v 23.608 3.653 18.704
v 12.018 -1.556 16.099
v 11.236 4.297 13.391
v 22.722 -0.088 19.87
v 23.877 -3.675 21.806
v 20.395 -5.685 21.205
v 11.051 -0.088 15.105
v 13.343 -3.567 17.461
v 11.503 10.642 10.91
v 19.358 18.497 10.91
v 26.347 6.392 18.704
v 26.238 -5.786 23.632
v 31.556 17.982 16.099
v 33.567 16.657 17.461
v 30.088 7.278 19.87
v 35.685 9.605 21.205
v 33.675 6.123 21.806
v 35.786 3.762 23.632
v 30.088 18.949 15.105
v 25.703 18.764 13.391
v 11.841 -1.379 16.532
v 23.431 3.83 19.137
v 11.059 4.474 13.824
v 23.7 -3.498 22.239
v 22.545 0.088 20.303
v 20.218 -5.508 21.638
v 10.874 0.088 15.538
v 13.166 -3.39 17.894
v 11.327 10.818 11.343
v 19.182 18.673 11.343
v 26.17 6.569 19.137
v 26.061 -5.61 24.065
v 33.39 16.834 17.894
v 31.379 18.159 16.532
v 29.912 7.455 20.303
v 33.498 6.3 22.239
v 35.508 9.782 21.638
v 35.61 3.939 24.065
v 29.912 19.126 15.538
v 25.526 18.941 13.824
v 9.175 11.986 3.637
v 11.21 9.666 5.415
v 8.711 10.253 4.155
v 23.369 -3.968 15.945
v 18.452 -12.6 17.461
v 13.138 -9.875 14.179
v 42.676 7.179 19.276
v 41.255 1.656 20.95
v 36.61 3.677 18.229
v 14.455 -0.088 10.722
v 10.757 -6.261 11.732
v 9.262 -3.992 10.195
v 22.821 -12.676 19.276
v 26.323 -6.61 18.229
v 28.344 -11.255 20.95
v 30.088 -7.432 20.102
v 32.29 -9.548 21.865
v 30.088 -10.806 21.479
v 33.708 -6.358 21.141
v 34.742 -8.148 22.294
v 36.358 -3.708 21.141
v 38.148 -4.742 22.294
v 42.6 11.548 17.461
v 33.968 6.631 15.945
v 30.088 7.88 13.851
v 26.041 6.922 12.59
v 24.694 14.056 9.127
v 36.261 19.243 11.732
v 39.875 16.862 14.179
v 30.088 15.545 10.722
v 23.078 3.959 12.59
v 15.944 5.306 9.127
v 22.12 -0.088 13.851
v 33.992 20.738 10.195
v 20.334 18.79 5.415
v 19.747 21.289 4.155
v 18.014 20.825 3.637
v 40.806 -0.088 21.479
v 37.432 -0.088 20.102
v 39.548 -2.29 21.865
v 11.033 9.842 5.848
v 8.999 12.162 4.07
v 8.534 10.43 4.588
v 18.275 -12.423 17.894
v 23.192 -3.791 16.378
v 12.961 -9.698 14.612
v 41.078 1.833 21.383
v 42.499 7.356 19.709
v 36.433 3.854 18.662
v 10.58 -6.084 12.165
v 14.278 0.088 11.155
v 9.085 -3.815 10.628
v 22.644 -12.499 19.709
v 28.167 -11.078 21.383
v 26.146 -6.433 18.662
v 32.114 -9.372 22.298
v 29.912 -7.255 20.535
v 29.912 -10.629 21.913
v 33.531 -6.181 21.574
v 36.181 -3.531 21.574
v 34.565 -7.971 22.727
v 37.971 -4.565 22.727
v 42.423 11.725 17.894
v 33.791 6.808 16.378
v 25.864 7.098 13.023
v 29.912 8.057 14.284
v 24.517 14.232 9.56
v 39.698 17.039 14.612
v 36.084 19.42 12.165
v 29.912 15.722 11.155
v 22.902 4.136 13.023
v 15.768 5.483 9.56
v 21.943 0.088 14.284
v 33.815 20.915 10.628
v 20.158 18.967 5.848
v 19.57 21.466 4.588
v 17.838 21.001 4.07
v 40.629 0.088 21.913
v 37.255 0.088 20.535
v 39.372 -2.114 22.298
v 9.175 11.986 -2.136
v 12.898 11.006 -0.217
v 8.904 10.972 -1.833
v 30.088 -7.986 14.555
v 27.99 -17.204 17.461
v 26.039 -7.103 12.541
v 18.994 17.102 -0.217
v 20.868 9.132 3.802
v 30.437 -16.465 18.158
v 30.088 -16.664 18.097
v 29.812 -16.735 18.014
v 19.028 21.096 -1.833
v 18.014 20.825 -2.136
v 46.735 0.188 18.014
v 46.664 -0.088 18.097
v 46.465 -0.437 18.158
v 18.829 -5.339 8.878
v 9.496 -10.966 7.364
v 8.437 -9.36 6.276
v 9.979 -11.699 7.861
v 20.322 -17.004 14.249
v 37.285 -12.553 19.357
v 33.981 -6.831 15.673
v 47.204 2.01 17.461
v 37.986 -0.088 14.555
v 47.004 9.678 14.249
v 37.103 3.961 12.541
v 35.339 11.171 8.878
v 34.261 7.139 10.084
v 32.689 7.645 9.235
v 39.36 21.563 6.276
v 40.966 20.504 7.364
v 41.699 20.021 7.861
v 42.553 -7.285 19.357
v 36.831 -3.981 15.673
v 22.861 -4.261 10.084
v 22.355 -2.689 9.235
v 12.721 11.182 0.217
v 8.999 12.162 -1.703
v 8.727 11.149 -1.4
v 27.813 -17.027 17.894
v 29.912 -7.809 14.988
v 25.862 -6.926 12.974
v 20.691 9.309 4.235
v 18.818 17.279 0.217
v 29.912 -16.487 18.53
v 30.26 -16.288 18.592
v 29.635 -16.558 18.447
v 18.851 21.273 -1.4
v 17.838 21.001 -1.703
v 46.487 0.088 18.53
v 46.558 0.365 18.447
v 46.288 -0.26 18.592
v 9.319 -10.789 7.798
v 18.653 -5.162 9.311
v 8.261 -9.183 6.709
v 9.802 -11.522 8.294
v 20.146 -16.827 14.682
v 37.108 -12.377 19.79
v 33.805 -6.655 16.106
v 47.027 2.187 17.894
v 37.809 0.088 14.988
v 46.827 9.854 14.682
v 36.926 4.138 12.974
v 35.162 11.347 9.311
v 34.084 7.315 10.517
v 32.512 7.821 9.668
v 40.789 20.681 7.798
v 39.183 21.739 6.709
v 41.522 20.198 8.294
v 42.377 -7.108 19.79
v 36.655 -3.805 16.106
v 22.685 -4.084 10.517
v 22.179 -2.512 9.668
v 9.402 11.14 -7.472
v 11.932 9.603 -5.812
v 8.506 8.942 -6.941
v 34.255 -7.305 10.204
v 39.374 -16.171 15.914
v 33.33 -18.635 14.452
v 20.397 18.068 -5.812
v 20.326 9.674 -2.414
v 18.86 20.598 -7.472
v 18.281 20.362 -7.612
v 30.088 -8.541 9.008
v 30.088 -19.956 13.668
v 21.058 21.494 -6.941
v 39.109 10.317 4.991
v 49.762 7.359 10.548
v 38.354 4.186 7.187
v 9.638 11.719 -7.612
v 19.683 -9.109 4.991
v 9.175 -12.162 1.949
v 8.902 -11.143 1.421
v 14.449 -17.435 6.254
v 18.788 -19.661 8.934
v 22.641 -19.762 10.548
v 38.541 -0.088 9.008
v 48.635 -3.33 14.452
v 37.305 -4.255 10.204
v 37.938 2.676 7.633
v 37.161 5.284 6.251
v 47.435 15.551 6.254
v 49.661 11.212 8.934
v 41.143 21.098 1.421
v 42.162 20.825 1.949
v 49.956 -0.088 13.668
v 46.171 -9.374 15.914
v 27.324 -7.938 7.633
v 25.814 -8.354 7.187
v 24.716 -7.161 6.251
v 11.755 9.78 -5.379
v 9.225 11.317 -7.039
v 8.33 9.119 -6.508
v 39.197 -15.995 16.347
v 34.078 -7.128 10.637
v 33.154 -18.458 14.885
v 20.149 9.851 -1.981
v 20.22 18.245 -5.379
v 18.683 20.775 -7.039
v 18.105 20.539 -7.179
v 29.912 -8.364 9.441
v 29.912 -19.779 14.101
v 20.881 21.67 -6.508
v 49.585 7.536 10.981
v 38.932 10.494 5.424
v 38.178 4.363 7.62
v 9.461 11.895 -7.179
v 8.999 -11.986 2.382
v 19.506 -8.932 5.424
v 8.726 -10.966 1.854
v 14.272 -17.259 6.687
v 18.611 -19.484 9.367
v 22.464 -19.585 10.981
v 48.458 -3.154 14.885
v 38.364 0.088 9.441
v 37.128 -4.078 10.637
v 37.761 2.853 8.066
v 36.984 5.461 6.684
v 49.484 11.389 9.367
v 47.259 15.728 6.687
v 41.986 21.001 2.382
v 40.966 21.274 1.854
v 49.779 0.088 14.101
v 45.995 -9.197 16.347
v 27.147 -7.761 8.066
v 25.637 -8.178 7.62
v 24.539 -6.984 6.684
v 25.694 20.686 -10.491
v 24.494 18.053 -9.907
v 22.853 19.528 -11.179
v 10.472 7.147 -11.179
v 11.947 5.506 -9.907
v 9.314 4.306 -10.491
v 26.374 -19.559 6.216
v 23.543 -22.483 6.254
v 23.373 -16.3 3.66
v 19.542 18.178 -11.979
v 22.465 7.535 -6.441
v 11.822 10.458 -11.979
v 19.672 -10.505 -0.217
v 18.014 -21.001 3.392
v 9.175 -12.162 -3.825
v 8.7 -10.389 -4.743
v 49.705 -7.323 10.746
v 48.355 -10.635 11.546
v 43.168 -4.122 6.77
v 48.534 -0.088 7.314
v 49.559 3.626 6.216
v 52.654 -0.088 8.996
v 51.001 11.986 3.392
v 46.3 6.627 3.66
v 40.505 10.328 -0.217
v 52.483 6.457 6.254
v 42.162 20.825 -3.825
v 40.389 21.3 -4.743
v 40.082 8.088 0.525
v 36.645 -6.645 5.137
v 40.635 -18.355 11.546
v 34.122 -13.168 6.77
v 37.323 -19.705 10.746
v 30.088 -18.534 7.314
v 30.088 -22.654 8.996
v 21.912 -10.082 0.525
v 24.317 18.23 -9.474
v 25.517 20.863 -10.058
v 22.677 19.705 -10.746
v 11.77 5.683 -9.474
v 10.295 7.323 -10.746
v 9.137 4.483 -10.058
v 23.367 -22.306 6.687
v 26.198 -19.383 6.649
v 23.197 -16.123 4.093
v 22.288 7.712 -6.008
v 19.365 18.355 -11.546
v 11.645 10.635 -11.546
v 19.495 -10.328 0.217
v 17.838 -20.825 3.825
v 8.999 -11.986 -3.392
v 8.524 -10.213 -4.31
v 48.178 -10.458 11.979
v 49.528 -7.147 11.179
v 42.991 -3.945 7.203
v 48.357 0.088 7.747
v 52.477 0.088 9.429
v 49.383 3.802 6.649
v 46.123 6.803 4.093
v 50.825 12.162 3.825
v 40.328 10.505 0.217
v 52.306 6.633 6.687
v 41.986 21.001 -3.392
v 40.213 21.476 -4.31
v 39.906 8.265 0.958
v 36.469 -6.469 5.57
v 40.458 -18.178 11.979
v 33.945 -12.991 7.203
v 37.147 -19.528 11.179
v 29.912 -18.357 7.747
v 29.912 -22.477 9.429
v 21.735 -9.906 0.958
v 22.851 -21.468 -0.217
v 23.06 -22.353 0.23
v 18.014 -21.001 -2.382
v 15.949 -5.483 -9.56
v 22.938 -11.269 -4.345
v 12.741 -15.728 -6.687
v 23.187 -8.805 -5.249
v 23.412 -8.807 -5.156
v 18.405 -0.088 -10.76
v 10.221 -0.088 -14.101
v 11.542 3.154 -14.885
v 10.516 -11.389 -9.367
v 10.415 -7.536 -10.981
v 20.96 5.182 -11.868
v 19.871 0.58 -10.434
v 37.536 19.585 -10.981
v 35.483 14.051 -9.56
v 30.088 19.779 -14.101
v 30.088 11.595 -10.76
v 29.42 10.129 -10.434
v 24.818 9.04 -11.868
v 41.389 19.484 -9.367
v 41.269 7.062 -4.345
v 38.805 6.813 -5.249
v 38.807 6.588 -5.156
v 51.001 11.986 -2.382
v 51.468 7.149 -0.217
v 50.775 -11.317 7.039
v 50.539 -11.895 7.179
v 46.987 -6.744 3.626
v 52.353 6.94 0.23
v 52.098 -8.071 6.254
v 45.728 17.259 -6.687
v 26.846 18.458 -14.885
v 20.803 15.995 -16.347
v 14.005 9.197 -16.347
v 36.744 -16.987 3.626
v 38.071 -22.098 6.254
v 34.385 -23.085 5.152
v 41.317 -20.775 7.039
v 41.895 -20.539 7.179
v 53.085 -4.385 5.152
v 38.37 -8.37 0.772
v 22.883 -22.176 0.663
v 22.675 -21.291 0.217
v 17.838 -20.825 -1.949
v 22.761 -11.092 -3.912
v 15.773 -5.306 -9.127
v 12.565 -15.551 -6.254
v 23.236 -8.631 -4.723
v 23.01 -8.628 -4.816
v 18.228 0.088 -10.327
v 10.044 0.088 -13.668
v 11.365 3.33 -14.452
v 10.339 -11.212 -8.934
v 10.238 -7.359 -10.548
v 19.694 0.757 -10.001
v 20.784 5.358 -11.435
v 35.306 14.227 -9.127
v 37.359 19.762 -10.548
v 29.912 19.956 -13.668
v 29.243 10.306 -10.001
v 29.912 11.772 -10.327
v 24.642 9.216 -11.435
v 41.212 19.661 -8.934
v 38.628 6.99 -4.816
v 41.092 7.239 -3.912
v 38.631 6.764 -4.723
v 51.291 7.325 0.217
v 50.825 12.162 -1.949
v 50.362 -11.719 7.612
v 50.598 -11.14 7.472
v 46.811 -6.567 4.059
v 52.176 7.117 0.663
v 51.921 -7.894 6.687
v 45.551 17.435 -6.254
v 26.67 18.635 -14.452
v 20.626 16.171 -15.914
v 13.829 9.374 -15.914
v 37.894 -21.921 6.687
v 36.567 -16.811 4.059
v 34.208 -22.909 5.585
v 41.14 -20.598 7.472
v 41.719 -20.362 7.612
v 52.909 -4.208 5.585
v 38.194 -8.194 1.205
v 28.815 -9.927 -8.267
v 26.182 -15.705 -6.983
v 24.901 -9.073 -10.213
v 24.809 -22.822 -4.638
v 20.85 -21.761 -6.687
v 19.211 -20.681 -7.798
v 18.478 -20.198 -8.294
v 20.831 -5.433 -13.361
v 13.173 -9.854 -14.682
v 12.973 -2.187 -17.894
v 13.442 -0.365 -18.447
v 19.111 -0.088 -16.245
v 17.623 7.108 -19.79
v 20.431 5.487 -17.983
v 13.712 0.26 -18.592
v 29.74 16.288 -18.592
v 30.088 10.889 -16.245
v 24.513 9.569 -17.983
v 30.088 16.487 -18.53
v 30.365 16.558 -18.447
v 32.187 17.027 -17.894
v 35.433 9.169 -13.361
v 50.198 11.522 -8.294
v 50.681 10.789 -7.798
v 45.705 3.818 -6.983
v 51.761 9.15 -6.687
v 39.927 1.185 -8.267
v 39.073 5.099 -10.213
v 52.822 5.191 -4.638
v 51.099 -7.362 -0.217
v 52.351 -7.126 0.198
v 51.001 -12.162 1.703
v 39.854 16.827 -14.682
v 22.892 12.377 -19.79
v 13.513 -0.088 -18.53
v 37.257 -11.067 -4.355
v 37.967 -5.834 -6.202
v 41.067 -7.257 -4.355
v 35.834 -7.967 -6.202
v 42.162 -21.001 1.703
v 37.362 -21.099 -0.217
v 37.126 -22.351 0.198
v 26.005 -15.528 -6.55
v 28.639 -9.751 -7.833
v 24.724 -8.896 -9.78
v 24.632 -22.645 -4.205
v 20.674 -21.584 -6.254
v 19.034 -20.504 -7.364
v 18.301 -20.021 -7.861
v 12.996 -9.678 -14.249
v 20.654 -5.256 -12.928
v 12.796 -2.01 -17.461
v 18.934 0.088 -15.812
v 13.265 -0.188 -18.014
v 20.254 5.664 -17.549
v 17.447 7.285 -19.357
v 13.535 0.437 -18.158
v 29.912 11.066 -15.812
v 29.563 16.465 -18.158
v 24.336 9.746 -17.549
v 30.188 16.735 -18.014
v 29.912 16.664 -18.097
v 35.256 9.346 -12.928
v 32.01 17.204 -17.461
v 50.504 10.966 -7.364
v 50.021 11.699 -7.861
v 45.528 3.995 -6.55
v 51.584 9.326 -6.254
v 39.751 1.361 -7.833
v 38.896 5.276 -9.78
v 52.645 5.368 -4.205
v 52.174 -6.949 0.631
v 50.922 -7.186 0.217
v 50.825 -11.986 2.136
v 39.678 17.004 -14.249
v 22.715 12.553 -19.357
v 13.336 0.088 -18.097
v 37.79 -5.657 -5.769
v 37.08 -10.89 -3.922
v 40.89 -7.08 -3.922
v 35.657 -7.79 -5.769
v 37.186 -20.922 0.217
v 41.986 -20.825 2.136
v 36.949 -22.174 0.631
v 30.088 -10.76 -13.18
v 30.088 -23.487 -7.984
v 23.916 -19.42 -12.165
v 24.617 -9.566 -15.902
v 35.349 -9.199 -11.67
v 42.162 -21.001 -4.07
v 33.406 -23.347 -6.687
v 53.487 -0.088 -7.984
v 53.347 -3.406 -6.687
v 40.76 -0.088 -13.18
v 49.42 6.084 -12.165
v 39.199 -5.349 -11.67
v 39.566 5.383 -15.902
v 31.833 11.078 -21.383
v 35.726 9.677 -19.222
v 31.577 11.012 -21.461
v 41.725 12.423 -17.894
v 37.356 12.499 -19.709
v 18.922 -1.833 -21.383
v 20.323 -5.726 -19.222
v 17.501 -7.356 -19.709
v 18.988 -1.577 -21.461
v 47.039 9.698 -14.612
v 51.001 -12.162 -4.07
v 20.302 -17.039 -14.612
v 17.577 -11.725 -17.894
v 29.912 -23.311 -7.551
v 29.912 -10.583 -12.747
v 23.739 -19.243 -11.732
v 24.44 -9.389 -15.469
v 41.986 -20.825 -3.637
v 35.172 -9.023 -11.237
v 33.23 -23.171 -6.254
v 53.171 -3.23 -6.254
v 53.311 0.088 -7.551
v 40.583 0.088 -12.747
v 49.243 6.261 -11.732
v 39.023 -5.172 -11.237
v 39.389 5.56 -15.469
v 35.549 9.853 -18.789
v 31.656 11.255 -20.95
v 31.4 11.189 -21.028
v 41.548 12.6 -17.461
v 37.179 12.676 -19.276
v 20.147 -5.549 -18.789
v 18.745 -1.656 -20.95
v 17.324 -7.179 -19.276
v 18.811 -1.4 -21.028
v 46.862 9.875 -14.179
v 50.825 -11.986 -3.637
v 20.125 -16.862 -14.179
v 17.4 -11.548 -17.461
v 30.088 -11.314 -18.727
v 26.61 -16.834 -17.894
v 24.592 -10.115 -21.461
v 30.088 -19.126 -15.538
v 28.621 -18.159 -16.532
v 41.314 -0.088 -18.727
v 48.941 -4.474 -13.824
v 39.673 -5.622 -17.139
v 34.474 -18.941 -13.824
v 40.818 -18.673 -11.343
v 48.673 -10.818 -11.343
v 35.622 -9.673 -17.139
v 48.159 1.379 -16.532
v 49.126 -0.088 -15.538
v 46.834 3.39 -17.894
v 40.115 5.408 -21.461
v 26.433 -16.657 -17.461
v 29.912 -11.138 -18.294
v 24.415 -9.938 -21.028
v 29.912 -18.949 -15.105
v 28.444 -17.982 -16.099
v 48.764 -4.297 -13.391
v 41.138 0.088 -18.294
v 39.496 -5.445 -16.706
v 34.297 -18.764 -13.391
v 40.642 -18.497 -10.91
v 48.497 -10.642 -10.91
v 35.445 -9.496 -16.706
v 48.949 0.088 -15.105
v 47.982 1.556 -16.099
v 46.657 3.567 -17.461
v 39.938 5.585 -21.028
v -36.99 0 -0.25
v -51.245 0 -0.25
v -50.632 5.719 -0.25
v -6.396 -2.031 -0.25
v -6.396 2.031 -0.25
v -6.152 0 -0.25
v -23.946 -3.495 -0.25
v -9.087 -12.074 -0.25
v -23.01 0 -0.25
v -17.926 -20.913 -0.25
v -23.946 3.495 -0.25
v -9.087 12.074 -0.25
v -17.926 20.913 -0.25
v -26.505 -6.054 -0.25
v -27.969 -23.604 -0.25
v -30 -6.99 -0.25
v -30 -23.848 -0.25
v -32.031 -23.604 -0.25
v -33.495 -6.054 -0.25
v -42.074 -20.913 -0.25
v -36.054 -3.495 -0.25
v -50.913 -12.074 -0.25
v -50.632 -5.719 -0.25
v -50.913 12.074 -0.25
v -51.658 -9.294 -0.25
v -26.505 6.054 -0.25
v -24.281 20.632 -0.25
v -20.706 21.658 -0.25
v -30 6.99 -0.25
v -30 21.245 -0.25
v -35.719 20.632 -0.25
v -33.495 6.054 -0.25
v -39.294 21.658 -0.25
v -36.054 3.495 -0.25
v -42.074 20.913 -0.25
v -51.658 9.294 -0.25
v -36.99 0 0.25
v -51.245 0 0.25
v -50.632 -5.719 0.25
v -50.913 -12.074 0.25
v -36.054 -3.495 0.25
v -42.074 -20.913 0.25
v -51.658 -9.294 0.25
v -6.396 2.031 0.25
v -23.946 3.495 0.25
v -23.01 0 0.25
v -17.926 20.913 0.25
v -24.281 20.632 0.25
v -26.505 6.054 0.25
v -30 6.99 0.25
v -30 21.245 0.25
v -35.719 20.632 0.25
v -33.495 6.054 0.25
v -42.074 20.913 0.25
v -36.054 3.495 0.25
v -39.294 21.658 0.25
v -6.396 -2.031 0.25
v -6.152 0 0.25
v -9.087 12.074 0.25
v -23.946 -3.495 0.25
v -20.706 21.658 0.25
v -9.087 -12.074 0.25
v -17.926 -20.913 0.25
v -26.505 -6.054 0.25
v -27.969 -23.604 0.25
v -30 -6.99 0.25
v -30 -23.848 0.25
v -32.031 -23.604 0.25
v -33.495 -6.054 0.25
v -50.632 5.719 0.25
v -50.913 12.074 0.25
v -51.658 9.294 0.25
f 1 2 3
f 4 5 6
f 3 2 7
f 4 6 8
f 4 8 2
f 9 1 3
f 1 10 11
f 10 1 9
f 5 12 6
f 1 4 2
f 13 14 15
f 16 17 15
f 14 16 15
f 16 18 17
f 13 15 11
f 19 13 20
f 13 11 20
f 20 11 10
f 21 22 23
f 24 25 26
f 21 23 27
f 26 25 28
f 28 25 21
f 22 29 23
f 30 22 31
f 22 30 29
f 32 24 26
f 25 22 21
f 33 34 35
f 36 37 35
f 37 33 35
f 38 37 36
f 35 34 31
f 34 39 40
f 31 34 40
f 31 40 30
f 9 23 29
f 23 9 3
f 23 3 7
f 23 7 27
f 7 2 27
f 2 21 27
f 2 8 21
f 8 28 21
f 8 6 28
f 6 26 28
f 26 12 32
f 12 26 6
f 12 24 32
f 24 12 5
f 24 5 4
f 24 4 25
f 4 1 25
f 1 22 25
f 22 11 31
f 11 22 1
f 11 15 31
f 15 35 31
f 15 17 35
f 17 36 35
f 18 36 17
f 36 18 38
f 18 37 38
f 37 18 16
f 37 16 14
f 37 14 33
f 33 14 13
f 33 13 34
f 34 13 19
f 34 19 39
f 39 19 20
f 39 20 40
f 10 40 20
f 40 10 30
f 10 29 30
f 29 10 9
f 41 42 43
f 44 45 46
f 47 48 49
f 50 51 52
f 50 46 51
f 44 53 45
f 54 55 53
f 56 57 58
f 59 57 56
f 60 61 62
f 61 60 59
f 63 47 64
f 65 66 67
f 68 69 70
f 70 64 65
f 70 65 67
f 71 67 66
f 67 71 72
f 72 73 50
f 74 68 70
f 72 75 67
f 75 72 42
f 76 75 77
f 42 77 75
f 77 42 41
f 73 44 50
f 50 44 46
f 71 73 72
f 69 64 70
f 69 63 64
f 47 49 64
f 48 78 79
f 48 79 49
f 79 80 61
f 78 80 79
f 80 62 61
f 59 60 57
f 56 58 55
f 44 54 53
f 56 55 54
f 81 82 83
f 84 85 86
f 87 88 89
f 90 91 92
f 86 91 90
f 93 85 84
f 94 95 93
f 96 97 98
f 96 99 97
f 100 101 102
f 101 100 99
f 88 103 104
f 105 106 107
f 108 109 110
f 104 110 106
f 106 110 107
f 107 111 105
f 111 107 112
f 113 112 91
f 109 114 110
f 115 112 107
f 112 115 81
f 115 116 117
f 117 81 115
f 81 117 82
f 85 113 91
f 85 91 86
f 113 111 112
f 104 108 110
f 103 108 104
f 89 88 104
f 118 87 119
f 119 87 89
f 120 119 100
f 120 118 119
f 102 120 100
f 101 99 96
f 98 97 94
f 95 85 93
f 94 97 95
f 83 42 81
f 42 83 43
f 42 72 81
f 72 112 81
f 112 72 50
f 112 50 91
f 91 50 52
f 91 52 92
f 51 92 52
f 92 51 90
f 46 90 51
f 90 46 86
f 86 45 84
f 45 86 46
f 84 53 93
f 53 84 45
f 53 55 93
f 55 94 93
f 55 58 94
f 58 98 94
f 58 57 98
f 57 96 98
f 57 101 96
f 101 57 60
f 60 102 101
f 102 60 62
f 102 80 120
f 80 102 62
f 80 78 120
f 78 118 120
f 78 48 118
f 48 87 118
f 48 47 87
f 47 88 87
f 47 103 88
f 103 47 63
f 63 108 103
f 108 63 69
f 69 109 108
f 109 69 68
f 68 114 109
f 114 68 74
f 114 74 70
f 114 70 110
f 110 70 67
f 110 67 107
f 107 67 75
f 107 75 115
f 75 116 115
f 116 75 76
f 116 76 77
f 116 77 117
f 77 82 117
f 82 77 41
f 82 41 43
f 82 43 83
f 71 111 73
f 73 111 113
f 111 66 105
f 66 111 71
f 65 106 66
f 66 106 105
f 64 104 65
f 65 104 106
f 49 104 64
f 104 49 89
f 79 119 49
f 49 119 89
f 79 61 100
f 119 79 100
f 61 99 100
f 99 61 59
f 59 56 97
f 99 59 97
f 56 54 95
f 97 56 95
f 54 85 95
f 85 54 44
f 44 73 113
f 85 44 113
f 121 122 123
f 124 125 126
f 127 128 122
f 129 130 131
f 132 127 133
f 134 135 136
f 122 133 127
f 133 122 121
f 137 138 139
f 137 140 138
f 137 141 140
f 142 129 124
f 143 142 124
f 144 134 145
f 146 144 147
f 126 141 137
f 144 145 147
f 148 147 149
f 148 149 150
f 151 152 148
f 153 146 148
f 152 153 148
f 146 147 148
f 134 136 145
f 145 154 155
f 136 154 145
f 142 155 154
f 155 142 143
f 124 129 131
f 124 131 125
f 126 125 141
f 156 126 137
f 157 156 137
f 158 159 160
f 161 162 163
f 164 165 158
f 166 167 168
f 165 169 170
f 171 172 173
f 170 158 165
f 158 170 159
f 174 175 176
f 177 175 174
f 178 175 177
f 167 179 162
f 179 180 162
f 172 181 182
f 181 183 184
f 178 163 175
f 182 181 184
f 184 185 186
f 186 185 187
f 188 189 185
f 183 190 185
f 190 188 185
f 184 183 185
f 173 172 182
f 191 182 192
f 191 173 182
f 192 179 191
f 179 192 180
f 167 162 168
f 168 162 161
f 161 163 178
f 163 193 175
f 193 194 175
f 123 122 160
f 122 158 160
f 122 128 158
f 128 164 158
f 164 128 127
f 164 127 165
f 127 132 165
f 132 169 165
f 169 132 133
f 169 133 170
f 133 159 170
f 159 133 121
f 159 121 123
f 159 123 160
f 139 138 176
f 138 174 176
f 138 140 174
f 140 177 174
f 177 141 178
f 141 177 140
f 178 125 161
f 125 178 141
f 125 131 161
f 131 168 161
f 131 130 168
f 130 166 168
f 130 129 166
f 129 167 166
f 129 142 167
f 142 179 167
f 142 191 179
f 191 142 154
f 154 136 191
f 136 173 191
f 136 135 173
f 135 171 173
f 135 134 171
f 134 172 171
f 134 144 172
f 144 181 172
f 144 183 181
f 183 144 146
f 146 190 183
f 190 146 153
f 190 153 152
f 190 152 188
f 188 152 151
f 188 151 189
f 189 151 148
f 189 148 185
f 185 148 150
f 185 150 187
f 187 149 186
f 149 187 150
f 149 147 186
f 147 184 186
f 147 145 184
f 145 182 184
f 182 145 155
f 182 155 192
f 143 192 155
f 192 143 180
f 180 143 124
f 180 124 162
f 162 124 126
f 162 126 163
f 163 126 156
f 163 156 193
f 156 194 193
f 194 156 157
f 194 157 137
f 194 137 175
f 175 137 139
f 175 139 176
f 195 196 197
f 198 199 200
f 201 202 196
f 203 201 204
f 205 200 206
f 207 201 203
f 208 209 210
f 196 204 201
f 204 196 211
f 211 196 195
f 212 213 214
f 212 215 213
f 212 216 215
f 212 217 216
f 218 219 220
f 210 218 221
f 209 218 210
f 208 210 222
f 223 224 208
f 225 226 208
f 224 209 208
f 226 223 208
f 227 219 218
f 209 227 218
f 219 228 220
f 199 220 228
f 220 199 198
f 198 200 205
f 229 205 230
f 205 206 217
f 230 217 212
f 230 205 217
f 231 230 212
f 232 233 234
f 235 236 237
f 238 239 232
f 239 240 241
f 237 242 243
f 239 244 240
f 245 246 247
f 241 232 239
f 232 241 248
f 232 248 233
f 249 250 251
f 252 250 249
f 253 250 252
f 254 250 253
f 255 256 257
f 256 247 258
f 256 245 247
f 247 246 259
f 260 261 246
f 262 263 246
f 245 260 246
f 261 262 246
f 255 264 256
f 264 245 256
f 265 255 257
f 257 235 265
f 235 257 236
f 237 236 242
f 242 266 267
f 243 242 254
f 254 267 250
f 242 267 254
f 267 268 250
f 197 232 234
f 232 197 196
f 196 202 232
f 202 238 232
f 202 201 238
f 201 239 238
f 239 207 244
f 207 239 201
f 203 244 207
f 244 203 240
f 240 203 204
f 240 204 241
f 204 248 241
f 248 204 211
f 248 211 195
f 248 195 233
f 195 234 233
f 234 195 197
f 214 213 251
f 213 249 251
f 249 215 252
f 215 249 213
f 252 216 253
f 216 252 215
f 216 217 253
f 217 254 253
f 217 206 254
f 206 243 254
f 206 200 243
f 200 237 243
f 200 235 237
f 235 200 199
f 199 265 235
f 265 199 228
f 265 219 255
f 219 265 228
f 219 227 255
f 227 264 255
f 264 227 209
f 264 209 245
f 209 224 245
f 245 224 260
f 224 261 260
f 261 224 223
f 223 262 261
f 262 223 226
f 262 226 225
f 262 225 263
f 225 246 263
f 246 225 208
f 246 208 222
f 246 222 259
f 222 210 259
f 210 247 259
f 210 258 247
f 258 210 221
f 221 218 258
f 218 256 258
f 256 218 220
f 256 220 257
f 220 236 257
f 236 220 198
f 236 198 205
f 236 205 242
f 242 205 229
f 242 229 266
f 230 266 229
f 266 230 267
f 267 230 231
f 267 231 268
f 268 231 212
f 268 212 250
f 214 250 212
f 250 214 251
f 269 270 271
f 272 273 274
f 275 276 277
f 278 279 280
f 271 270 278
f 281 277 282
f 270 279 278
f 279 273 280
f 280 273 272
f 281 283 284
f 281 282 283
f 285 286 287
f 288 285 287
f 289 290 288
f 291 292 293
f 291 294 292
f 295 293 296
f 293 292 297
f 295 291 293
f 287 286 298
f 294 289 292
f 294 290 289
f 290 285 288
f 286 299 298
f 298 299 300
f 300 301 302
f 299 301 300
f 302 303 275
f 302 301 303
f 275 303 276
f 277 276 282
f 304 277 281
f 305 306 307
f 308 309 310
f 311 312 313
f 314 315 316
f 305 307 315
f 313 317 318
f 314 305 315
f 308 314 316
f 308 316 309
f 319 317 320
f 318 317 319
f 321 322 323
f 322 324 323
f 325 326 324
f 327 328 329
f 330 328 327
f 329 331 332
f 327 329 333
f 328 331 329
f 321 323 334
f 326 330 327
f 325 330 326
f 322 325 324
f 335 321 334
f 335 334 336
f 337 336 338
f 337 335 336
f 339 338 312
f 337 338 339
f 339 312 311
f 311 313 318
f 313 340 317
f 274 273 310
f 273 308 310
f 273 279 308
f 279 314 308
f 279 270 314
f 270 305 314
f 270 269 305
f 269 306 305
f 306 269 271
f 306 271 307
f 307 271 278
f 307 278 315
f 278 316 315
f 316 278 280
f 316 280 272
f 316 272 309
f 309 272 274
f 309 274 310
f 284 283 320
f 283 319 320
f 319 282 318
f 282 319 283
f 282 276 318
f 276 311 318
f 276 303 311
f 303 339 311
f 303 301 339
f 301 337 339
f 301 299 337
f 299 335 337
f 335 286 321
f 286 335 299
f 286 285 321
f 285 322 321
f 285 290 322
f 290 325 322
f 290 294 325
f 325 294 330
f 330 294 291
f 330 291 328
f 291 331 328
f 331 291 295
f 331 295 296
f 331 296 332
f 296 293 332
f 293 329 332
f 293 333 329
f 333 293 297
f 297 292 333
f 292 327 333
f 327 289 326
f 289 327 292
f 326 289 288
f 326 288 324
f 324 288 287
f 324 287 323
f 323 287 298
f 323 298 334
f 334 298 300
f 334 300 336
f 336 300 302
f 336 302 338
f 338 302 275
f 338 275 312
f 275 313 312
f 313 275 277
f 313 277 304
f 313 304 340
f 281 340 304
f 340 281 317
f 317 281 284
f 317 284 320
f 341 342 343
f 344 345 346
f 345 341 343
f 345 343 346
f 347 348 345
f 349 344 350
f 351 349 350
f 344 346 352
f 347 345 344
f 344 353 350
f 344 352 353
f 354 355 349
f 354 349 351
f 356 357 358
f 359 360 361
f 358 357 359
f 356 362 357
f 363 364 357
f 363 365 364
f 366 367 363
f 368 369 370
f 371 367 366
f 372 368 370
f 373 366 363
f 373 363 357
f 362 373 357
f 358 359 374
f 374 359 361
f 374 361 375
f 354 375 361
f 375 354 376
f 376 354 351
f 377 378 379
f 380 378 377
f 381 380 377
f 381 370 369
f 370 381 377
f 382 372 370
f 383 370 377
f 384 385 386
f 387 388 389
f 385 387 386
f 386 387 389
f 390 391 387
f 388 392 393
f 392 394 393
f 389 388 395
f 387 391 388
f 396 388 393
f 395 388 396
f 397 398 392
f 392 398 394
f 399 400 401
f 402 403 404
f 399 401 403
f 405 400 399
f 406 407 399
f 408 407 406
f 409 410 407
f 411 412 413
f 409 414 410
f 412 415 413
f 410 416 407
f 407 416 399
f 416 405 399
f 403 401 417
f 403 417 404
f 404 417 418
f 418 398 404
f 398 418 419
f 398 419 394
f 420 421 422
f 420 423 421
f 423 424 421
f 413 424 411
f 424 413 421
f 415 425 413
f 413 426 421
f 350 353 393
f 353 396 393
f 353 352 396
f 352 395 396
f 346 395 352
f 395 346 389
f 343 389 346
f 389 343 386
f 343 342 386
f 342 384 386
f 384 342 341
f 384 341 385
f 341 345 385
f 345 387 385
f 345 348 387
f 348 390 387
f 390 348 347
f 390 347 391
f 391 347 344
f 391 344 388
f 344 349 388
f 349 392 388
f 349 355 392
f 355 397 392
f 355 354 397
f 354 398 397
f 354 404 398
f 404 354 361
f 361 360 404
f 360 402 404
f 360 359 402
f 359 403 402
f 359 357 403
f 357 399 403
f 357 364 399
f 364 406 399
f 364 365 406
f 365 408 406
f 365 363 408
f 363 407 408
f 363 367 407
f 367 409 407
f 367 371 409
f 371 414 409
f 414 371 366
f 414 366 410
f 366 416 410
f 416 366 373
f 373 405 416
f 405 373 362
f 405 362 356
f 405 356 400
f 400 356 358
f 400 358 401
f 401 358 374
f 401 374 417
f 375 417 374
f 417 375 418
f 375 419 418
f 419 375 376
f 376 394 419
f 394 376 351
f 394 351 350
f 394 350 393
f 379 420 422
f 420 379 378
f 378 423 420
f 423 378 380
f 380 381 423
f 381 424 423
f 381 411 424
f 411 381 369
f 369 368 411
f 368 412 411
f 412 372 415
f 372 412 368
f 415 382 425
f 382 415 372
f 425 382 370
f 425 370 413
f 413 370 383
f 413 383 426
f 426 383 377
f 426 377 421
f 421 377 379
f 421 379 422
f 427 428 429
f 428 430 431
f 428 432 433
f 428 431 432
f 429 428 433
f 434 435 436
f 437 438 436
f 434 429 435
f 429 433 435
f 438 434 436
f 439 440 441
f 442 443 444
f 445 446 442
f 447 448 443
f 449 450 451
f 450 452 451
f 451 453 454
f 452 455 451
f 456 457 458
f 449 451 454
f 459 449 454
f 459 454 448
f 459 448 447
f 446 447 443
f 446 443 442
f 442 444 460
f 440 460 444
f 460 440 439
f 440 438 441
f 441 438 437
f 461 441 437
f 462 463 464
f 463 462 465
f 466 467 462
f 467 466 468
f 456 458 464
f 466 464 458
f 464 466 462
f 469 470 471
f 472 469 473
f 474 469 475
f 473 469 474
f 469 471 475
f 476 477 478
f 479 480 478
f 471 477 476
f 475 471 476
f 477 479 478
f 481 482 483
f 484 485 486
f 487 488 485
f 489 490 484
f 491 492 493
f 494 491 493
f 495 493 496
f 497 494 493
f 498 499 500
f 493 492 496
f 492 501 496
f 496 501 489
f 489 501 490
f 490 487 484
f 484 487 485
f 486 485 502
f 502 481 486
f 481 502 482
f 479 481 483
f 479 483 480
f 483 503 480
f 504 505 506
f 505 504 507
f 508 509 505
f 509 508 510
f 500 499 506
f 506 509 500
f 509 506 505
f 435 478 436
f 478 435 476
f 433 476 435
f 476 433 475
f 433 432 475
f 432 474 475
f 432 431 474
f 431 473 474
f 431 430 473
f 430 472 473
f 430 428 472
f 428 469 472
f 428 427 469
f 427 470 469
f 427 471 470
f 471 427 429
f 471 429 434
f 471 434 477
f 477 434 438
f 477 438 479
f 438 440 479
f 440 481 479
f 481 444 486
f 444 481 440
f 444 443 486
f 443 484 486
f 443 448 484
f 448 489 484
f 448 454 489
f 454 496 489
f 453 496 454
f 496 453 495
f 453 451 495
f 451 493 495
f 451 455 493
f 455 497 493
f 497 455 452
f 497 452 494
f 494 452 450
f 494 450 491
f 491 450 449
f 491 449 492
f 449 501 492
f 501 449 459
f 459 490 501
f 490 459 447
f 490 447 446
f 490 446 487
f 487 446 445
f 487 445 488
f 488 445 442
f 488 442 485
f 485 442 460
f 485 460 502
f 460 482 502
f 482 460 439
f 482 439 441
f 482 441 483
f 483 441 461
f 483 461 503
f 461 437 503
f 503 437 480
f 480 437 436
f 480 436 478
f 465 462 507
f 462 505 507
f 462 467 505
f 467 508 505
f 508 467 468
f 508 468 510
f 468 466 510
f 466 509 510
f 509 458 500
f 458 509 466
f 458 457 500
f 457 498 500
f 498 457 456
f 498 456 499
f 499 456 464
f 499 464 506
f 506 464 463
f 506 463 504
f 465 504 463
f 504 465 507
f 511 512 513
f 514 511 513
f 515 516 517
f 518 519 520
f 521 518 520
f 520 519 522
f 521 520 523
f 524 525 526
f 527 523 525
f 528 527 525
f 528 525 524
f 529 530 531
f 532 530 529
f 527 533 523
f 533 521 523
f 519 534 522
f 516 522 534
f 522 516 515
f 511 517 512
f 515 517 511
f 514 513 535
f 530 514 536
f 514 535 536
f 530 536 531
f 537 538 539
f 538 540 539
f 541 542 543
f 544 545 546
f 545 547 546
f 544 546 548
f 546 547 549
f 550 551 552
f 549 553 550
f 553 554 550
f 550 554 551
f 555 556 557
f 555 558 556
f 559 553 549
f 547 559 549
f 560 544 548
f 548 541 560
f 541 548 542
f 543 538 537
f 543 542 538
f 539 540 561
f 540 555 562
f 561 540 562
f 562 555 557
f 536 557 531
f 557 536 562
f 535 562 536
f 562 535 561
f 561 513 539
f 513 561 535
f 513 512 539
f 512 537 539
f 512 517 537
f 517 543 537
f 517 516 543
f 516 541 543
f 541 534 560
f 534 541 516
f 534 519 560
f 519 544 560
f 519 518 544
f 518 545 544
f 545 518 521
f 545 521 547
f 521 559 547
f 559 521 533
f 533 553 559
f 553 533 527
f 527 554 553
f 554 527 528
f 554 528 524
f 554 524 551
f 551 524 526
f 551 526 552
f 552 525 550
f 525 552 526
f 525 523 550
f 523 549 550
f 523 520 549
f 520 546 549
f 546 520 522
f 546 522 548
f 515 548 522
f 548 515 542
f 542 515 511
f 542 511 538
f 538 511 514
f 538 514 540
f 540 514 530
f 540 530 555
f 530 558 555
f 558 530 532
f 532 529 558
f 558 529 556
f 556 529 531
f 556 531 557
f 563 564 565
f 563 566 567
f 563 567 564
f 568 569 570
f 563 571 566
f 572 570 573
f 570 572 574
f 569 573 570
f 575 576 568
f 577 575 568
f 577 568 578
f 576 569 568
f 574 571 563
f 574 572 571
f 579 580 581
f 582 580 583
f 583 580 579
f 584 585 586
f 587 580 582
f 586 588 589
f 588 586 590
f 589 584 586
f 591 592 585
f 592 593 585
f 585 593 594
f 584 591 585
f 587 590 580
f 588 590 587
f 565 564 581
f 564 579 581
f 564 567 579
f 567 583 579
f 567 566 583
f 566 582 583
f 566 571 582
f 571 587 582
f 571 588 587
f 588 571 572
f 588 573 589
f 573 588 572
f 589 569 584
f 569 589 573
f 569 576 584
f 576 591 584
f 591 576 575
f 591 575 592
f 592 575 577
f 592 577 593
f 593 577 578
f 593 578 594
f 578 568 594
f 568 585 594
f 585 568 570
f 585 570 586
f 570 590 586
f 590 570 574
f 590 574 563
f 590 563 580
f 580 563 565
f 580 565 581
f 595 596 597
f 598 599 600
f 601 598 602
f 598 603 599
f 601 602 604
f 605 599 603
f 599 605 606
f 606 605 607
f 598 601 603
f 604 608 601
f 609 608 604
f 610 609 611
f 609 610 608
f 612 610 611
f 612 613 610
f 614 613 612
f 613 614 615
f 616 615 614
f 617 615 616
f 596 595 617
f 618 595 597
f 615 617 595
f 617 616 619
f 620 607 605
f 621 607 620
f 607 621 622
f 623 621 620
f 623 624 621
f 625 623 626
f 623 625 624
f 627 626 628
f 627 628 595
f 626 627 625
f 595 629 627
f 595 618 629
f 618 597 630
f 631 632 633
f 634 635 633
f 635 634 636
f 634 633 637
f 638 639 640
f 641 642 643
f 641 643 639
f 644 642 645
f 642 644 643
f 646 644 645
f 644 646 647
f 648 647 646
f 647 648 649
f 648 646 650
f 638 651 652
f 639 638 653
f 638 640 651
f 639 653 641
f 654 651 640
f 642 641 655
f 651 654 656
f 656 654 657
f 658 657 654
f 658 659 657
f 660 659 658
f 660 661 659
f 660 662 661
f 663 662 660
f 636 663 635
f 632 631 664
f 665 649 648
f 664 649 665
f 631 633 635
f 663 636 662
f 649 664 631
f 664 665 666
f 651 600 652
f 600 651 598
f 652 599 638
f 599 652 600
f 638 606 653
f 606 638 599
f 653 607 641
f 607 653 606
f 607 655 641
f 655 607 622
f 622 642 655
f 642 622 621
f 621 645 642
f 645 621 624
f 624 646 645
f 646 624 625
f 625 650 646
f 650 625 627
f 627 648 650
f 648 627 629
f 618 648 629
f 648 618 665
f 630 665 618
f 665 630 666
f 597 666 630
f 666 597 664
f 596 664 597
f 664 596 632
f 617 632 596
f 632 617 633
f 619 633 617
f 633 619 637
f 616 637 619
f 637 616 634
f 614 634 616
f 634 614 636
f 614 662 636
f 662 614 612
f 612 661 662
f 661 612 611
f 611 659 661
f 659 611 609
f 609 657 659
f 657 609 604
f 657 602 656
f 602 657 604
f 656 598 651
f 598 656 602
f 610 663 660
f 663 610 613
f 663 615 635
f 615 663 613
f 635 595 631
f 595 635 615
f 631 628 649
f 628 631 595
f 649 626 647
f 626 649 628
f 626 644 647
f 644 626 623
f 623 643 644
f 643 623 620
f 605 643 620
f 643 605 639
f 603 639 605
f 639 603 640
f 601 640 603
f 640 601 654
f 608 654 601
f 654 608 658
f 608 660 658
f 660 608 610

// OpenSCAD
//created with rubyscad 1.0

$fa = 30;
translate(v = [-30, 0]) {
   linear_extrude(center = true, height = 0.500) 
   projection(cut = false) 
   difference() {
      sphere(r = 25); 
      cylinder(h = 62.500, r1 = 12.500, r2 = 6.250, center = true); 
      rotate(a = [90, 0]) 
      cylinder(h = 62.500, r1 = 12.500, r2 = 6.250, center = true); 
      rotate(a = [0, 90]) 
      cylinder(h = 62.500, r1 = 12.500, r2 = 6.250, center = true); 
   }
   %difference() {
      sphere(r = 25); 
      cylinder(h = 62.500, r1 = 12.500, r2 = 6.250, center = true); 
      rotate(a = [90, 0]) 
      cylinder(h = 62.500, r1 = 12.500, r2 = 6.250, center = true); 
      rotate(a = [0, 90]) 
      cylinder(h = 62.500, r1 = 12.500, r2 = 6.250, center = true); 
   }
}
translate(v = [30, 0]) {
   rotate(a = -30, v = [1, 1, 0]) 
   translate(v = [0, 0, 20]) 
   linear_extrude(center = true, height = 0.500) 
   projection(cut = true) 
   translate(v = [0, 0, -20]) 
   rotate(a = 30, v = [1, 1, 0]) 
   difference() {
      sphere(r = 25); 
      cylinder(h = 62.500, r1 = 12.500, r2 = 6.250, center = true); 
      rotate(a = [90, 0]) 
      cylinder(h = 62.500, r1 = 12.500, r2 = 6.250, center = true); 
      rotate(a = [0, 90]) 
      cylinder(h = 62.500, r1 = 12.500, r2 = 6.250, center = true); 
   }
   rotate(a = -30, v = [1, 1, 0]) 
   translate(v = [0, 0, 15]) 
   linear_extrude(center = true, height = 0.500) 
   projection(cut = true) 
   translate(v = [0, 0, -15]) 
   rotate(a = 30, v = [1, 1, 0]) 
   difference() {
      sphere(r = 25); 
      cylinder(h = 62.500, r1 = 12.500, r2 = 6.250, center = true); 
      rotate(a = [90, 0]) 
      cylinder(h = 62.500, r1 = 12.500, r2 = 6.250, center = true); 
      rotate(a = [0, 90]) 
      cylinder(h = 62.500, r1 = 12.500, r2 = 6.250, center = true); 
   }
   rotate(a = -30, v = [1, 1, 0]) 
   translate(v = [0, 0, 10]) 
   linear_extrude(center = true, height = 0.500) 
   projection(cut = true) 
   translate(v = [0, 0, -10]) 
   rotate(a = 30, v = [1, 1, 0]) 
   difference() {
      sphere(r = 25); 
      cylinder(h = 62.500, r1 = 12.500, r2 = 6.250, center = true); 
      rotate(a = [90, 0]) 
      cylinder(h = 62.500, r1 = 12.500, r2 = 6.250, center = true); 
      rotate(a = [0, 90]) 
      cylinder(h = 62.500, r1 = 12.500, r2 = 6.250, center = true); 
   }
   rotate(a = -30, v = [1, 1, 0]) 
   translate(v = [0, 0, 5]) 
   linear_extrude(center = true, height = 0.500) 
   projection(cut = true) 
   translate(v = [0, 0, -5]) 
   rotate(a = 30, v = [1, 1, 0]) 
   difference() {
      sphere(r = 25); 
      cylinder(h = 62.500, r1 = 12.500, r2 = 6.250, center = true); 
      rotate(a = [90, 0]) 
      cylinder(h = 62.500, r1 = 12.500, r2 = 6.250, center = true); 
      rotate(a = [0, 90]) 
      cylinder(h = 62.500, r1 = 12.500, r2 = 6.250, center = true); 
   }
   rotate(a = -30, v = [1, 1, 0]) 
   translate(v = [0, 0, 0]) 
   linear_extrude(center = true, height = 0.500) 
   projection(cut = true) 
   translate(v = [0, 0, 0]) 
   rotate(a = 30, v = [1, 1, 0]) 
   difference() {
      sphere(r = 25); 
      cylinder(h = 62.500, r1 = 12.500, r2 = 6.250, center = true); 
      rotate(a = [90, 0]) 
      cylinder(h = 62.500, r1 = 12.500, r2 = 6.250, center = true); 
      rotate(a = [0, 90]) 
      cylinder(h = 62.500, r1 = 12.500, r2 = 6.250, center = true); 
   }
   rotate(a = -30, v = [1, 1, 0]) 
   translate(v = [0, 0, -5]) 
   linear_extrude(center = true, height = 0.500) 
   projection(cut = true) 
   translate(v = [0, 0, 5]) 
   rotate(a = 30, v = [1, 1, 0]) 
   difference() {
      sphere(r = 25); 
      cylinder(h = 62.500, r1 = 12.500, r2 = 6.250, center = true); 
      rotate(a = [90, 0]) 
      cylinder(h = 62.500, r1 = 12.500, r2 = 6.250, center = true); 
      rotate(a = [0, 90]) 
      cylinder(h = 62.500, r1 = 12.500, r2 = 6.250, center = true); 
   }
   rotate(a = -30, v = [1, 1, 0]) 
   translate(v = [0, 0, -10]) 
   linear_extrude(center = true, height = 0.500) 
   projection(cut = true) 
   translate(v = [0, 0, 10]) 
   rotate(a = 30, v = [1, 1, 0]) 
   difference() {
      sphere(r = 25); 
      cylinder(h = 62.500, r1 = 12.500, r2 = 6.250, center = true); 
      rotate(a = [90, 0]) 
      cylinder(h = 62.500, r1 = 12.500, r2 = 6.250, center = true); 
      rotate(a = [0, 90]) 
      cylinder(h = 62.500, r1 = 12.500, r2 = 6.250, center = true); 
   }
   rotate(a = -30, v = [1, 1, 0]) 
   translate(v = [0, 0, -15]) 
   linear_extrude(center = true, height = 0.500) 
   projection(cut = true) 
   translate(v = [0, 0, 15]) 
   rotate(a = 30, v = [1, 1, 0]) 
   difference() {
      sphere(r = 25); 
      cylinder(h = 62.500, r1 = 12.500, r2 = 6.250, center = true); 
      rotate(a = [90, 0]) 
      cylinder(h = 62.500, r1 = 12.500, r2 = 6.250, center = true); 
      rotate(a = [0, 90]) 
      cylinder(h = 62.500, r1 = 12.500, r2 = 6.250, center = true); 
   }
   rotate(a = -30, v = [1, 1, 0]) 
   translate(v = [0, 0, -20]) 
   linear_extrude(center = true, height = 0.500) 
   projection(cut = true) 
   translate(v = [0, 0, 20]) 
   rotate(a = 30, v = [1, 1, 0]) 
   difference() {
      sphere(r = 25); 
      cylinder(h = 62.500, r1 = 12.500, r2 = 6.250, center = true); 
      rotate(a = [90, 0]) 
      cylinder(h = 62.500, r1 = 12.500, r2 = 6.250, center = true); 
      rotate(a = [0, 90]) 
      cylinder(h = 62.500, r1 = 12.500, r2 = 6.250, center = true); 
   }
   %difference() {
      sphere(r = 25); 
      cylinder(h = 62.500, r1 = 12.500, r2 = 6.250, center = true); 
      rotate(a = [90, 0]) 
      cylinder(h = 62.500, r1 = 12.500, r2 = 6.250, center = true); 
      rotate(a = [0, 90]) 
      cylinder(h = 62.500, r1 = 12.500, r2 = 6.250, center = true); 
   }
}
